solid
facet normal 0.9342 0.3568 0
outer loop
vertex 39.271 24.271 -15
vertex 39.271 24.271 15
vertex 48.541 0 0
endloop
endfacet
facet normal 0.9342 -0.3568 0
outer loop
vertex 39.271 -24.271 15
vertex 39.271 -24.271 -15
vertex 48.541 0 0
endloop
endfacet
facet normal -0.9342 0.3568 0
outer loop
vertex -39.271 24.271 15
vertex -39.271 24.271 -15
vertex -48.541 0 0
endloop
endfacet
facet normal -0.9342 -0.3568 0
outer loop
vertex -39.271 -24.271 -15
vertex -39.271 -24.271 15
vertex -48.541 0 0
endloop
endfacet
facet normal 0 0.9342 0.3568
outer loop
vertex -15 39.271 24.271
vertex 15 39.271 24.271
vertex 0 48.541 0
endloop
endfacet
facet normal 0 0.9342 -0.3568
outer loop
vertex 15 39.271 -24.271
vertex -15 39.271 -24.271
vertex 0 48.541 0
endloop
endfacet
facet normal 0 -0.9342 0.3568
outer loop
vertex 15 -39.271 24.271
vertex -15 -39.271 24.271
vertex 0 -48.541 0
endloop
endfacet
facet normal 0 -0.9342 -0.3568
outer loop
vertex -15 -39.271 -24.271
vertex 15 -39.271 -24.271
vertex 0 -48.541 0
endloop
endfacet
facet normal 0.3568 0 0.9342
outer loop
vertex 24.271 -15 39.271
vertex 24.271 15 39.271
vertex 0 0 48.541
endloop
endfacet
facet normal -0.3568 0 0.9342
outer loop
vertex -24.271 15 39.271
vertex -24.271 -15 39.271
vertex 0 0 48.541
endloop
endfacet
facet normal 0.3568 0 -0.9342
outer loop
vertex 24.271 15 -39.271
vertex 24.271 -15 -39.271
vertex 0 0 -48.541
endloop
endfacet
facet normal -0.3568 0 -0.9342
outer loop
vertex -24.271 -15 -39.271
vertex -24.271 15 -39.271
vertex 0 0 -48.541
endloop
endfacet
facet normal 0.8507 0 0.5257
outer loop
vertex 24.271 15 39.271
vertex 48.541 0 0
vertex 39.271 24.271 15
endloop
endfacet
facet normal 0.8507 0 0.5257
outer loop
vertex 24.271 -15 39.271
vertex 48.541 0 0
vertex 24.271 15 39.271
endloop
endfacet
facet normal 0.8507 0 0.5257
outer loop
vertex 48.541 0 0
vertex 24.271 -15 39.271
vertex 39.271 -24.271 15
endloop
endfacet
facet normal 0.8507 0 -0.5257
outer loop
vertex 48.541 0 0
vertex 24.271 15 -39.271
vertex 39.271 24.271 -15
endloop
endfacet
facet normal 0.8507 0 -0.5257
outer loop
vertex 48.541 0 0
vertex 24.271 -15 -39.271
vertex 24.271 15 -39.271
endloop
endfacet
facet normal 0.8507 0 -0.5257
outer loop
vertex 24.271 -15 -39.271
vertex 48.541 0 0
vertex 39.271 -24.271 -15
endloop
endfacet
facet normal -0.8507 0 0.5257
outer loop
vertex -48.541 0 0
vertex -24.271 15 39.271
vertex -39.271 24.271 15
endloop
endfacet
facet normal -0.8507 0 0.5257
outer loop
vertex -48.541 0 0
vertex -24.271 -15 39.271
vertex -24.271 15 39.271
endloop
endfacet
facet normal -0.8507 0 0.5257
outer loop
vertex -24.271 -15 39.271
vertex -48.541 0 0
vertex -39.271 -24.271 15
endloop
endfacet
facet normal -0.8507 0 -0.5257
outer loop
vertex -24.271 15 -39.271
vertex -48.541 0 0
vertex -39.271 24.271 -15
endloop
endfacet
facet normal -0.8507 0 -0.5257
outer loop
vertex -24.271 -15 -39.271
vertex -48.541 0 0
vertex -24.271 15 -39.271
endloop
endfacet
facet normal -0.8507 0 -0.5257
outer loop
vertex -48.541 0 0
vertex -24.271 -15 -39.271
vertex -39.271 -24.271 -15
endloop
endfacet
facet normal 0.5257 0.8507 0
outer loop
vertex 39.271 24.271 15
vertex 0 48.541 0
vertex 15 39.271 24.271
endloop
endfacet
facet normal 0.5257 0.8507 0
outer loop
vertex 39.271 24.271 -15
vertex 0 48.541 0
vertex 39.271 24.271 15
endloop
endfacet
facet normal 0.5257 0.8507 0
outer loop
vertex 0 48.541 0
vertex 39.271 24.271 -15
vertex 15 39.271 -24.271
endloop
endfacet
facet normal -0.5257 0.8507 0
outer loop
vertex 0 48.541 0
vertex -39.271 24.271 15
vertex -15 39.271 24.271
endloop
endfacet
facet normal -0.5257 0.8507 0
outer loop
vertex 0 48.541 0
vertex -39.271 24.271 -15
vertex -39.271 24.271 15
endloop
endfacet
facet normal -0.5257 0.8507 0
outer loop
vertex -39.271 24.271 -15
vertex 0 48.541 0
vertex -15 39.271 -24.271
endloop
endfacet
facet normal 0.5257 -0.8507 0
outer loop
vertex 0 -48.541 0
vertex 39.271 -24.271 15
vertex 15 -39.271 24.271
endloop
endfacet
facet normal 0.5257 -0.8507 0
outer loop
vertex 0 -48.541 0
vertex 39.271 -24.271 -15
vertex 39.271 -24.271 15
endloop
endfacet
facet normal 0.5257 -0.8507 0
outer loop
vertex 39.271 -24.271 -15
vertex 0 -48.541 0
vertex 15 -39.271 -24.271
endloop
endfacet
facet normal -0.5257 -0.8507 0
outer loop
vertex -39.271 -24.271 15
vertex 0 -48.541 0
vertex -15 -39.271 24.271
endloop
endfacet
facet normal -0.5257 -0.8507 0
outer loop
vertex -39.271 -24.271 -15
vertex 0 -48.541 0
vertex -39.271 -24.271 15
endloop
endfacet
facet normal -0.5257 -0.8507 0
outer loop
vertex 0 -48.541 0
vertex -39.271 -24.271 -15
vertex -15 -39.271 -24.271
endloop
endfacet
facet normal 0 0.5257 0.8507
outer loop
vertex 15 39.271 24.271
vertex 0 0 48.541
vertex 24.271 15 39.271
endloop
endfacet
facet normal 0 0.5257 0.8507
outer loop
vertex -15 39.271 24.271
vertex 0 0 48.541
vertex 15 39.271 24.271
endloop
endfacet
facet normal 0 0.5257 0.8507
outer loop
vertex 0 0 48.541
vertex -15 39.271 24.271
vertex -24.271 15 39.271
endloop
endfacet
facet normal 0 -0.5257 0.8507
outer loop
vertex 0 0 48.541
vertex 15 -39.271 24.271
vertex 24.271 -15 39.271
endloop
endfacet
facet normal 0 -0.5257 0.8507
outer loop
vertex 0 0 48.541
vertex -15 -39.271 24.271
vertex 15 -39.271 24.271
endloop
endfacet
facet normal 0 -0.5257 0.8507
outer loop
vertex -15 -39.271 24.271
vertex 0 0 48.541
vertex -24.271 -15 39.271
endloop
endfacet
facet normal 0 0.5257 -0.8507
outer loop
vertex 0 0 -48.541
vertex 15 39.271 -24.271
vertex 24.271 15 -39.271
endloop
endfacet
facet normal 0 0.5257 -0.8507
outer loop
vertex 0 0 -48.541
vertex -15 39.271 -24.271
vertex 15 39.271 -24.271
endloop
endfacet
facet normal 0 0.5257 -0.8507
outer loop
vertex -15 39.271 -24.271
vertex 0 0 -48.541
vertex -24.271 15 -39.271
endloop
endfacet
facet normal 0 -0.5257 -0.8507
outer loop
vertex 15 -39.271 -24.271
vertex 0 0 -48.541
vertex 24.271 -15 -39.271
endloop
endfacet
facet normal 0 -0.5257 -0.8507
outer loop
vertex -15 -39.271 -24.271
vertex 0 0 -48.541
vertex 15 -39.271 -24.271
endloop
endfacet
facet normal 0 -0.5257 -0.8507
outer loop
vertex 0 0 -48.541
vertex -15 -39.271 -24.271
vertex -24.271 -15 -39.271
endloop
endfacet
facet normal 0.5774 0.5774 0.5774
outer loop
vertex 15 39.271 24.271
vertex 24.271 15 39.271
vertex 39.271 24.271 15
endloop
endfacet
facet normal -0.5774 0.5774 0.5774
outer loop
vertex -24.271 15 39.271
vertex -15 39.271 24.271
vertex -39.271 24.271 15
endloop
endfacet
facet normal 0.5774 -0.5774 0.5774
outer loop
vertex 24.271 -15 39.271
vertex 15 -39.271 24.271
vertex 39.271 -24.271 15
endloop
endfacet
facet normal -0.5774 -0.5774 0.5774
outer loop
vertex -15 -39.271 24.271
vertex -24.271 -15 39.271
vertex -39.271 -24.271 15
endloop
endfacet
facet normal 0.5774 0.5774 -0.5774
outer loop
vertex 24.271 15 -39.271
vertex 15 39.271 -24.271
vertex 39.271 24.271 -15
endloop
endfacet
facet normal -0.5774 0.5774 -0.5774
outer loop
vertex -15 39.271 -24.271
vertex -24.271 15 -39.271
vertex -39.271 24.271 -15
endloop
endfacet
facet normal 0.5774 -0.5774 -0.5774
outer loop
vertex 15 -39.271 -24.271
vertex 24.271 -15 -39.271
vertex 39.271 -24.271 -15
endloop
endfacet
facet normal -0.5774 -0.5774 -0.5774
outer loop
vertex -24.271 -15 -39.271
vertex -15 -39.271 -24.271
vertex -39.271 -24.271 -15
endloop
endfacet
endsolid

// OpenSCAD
// Icosidodecahedron
// (C) @oblomobka - 2023.06
// GPL license

/* **CUSTOMIZER VARIABLES** */
// Edge
edge = 30; // [10:100]
// Center of the solid or stand over a face
position = "Center"; // ["Center", "Face"]

/* **MODULES** */   
module Icosidodecahedron( edge = 30, position = "Face"){ //aD -> Conway notation 
    // Constants
    phi = (1+sqrt(5))/2; // Golden ratio = 1,618...
    
    // Invariants
    angle_aD = asin(2*sqrt((5+sqrt(5))/10)/(1+sqrt(5))); // angle vertex to center pentagon
    hPentagon = sqrt(phi^2-((5+sqrt(5))/10));
    
    // Variables
    r = edge*phi;
    a = edge*(phi^2)/2;
    b = edge*phi/2;
    c = edge/2;
    
    // Definition of points and faces V = 30 / F = 32 ( 20 triangles + 12 pentagons )
    // (0, 0, ±φ) and even permutations of ( ±φ^2/2, ±φ/2, ±1/2 )
    aDpoints = [
        [ +r,  0,  0], [  0, +r,  0], [  0,  0, +r], [ -r,  0,  0], [  0, -r,  0], [  0,  0, -r],  // [  0 -  5]
        
        // Rectangle XYZ
        [ +a, +b, +c], [ -a, +b, +c], [ +a, -b, +c], [ -a, -b, +c],     // UP       [  6 -  9]
        [ +a, +b, -c], [ -a, +b, -c], [ +a, -b, -c], [ -a, -b, -c],     // Down     [ 10 - 13]
        
        // Rectangle XZY
        [ +b, +c, +a], [ -b, +c, +a], [ +b, -c, +a], [ -b, -c, +a],     // UP       [ 14 - 17]
        [ +b, +c, -a], [ -b, +c, -a], [ +b, -c, -a], [ -b, -c, -a],     // Down     [ 18 - 21]
        
        // Rectangle YZX
        [ +c, +a, +b], [ -c, +a, +b], [ +c, -a, +b], [ -c, -a, +b],     // UP       [ 22 - 25]
        [ +c, +a, -b], [ -c, +a, -b], [ +c, -a, -b], [ -c, -a, -b]      // DOWN     [ 26 - 29]
        ];
    
    aDfaces = [
        [  0,  6, 10], [  0, 12,  8], [  3, 11,  7], [  3,  9, 13],     // triangles touching X axis
        [  1, 22, 23], [  1, 27, 26], [  4, 25, 24], [  4, 28, 29],     // triangles touching Y axis
        [  2, 14, 16], [  2, 17, 15], [  5, 20, 18], [  5, 19, 21],     // triangles touching Z axis
        
        [  0,  8, 16, 14,  6], [  0, 10, 18, 20, 12], [  3,  7, 15, 17,  9], [  3, 13, 21, 19, 11],  // pentagons touching X axis
        [  1, 26, 10,  6, 22], [  1, 23,  7, 11, 27], [  4, 24,  8, 12, 28], [  4, 29, 13,  9, 25],  // pentagons touching X axis
        [  2, 15, 23, 22, 14], [  2, 16, 24, 25, 17], [  5, 18, 26, 27, 19], [  5, 21, 29, 28, 20],  // pentagons touching Z axis
        
        [  6, 14, 22], [  7, 23, 15], [  8, 24, 16], [  9, 17, 25],     // triangles in octants UP
        [ 10, 26, 18], [ 11, 19, 27], [ 12, 20, 28], [ 13, 29, 21]      // triangles in octants DOWN
        ];
  
    // Polyhedron stands on xy plane centered on the center of the face or centered on the center of polyhedron
    if ( position == "Center") {
        polyhedron ( aDpoints, aDfaces);
        }
        
    else if ( position == "Face") {
        translate ([ 0, 0, (hPentagon*edge)])
            rotate ([ 0, 90-angle_aD, 0])
                polyhedron ( aDpoints, aDfaces);}
    }
    
/* **RENDERING OF SOLIDS** */
Icosidodecahedron(edge=edge, position=position);
